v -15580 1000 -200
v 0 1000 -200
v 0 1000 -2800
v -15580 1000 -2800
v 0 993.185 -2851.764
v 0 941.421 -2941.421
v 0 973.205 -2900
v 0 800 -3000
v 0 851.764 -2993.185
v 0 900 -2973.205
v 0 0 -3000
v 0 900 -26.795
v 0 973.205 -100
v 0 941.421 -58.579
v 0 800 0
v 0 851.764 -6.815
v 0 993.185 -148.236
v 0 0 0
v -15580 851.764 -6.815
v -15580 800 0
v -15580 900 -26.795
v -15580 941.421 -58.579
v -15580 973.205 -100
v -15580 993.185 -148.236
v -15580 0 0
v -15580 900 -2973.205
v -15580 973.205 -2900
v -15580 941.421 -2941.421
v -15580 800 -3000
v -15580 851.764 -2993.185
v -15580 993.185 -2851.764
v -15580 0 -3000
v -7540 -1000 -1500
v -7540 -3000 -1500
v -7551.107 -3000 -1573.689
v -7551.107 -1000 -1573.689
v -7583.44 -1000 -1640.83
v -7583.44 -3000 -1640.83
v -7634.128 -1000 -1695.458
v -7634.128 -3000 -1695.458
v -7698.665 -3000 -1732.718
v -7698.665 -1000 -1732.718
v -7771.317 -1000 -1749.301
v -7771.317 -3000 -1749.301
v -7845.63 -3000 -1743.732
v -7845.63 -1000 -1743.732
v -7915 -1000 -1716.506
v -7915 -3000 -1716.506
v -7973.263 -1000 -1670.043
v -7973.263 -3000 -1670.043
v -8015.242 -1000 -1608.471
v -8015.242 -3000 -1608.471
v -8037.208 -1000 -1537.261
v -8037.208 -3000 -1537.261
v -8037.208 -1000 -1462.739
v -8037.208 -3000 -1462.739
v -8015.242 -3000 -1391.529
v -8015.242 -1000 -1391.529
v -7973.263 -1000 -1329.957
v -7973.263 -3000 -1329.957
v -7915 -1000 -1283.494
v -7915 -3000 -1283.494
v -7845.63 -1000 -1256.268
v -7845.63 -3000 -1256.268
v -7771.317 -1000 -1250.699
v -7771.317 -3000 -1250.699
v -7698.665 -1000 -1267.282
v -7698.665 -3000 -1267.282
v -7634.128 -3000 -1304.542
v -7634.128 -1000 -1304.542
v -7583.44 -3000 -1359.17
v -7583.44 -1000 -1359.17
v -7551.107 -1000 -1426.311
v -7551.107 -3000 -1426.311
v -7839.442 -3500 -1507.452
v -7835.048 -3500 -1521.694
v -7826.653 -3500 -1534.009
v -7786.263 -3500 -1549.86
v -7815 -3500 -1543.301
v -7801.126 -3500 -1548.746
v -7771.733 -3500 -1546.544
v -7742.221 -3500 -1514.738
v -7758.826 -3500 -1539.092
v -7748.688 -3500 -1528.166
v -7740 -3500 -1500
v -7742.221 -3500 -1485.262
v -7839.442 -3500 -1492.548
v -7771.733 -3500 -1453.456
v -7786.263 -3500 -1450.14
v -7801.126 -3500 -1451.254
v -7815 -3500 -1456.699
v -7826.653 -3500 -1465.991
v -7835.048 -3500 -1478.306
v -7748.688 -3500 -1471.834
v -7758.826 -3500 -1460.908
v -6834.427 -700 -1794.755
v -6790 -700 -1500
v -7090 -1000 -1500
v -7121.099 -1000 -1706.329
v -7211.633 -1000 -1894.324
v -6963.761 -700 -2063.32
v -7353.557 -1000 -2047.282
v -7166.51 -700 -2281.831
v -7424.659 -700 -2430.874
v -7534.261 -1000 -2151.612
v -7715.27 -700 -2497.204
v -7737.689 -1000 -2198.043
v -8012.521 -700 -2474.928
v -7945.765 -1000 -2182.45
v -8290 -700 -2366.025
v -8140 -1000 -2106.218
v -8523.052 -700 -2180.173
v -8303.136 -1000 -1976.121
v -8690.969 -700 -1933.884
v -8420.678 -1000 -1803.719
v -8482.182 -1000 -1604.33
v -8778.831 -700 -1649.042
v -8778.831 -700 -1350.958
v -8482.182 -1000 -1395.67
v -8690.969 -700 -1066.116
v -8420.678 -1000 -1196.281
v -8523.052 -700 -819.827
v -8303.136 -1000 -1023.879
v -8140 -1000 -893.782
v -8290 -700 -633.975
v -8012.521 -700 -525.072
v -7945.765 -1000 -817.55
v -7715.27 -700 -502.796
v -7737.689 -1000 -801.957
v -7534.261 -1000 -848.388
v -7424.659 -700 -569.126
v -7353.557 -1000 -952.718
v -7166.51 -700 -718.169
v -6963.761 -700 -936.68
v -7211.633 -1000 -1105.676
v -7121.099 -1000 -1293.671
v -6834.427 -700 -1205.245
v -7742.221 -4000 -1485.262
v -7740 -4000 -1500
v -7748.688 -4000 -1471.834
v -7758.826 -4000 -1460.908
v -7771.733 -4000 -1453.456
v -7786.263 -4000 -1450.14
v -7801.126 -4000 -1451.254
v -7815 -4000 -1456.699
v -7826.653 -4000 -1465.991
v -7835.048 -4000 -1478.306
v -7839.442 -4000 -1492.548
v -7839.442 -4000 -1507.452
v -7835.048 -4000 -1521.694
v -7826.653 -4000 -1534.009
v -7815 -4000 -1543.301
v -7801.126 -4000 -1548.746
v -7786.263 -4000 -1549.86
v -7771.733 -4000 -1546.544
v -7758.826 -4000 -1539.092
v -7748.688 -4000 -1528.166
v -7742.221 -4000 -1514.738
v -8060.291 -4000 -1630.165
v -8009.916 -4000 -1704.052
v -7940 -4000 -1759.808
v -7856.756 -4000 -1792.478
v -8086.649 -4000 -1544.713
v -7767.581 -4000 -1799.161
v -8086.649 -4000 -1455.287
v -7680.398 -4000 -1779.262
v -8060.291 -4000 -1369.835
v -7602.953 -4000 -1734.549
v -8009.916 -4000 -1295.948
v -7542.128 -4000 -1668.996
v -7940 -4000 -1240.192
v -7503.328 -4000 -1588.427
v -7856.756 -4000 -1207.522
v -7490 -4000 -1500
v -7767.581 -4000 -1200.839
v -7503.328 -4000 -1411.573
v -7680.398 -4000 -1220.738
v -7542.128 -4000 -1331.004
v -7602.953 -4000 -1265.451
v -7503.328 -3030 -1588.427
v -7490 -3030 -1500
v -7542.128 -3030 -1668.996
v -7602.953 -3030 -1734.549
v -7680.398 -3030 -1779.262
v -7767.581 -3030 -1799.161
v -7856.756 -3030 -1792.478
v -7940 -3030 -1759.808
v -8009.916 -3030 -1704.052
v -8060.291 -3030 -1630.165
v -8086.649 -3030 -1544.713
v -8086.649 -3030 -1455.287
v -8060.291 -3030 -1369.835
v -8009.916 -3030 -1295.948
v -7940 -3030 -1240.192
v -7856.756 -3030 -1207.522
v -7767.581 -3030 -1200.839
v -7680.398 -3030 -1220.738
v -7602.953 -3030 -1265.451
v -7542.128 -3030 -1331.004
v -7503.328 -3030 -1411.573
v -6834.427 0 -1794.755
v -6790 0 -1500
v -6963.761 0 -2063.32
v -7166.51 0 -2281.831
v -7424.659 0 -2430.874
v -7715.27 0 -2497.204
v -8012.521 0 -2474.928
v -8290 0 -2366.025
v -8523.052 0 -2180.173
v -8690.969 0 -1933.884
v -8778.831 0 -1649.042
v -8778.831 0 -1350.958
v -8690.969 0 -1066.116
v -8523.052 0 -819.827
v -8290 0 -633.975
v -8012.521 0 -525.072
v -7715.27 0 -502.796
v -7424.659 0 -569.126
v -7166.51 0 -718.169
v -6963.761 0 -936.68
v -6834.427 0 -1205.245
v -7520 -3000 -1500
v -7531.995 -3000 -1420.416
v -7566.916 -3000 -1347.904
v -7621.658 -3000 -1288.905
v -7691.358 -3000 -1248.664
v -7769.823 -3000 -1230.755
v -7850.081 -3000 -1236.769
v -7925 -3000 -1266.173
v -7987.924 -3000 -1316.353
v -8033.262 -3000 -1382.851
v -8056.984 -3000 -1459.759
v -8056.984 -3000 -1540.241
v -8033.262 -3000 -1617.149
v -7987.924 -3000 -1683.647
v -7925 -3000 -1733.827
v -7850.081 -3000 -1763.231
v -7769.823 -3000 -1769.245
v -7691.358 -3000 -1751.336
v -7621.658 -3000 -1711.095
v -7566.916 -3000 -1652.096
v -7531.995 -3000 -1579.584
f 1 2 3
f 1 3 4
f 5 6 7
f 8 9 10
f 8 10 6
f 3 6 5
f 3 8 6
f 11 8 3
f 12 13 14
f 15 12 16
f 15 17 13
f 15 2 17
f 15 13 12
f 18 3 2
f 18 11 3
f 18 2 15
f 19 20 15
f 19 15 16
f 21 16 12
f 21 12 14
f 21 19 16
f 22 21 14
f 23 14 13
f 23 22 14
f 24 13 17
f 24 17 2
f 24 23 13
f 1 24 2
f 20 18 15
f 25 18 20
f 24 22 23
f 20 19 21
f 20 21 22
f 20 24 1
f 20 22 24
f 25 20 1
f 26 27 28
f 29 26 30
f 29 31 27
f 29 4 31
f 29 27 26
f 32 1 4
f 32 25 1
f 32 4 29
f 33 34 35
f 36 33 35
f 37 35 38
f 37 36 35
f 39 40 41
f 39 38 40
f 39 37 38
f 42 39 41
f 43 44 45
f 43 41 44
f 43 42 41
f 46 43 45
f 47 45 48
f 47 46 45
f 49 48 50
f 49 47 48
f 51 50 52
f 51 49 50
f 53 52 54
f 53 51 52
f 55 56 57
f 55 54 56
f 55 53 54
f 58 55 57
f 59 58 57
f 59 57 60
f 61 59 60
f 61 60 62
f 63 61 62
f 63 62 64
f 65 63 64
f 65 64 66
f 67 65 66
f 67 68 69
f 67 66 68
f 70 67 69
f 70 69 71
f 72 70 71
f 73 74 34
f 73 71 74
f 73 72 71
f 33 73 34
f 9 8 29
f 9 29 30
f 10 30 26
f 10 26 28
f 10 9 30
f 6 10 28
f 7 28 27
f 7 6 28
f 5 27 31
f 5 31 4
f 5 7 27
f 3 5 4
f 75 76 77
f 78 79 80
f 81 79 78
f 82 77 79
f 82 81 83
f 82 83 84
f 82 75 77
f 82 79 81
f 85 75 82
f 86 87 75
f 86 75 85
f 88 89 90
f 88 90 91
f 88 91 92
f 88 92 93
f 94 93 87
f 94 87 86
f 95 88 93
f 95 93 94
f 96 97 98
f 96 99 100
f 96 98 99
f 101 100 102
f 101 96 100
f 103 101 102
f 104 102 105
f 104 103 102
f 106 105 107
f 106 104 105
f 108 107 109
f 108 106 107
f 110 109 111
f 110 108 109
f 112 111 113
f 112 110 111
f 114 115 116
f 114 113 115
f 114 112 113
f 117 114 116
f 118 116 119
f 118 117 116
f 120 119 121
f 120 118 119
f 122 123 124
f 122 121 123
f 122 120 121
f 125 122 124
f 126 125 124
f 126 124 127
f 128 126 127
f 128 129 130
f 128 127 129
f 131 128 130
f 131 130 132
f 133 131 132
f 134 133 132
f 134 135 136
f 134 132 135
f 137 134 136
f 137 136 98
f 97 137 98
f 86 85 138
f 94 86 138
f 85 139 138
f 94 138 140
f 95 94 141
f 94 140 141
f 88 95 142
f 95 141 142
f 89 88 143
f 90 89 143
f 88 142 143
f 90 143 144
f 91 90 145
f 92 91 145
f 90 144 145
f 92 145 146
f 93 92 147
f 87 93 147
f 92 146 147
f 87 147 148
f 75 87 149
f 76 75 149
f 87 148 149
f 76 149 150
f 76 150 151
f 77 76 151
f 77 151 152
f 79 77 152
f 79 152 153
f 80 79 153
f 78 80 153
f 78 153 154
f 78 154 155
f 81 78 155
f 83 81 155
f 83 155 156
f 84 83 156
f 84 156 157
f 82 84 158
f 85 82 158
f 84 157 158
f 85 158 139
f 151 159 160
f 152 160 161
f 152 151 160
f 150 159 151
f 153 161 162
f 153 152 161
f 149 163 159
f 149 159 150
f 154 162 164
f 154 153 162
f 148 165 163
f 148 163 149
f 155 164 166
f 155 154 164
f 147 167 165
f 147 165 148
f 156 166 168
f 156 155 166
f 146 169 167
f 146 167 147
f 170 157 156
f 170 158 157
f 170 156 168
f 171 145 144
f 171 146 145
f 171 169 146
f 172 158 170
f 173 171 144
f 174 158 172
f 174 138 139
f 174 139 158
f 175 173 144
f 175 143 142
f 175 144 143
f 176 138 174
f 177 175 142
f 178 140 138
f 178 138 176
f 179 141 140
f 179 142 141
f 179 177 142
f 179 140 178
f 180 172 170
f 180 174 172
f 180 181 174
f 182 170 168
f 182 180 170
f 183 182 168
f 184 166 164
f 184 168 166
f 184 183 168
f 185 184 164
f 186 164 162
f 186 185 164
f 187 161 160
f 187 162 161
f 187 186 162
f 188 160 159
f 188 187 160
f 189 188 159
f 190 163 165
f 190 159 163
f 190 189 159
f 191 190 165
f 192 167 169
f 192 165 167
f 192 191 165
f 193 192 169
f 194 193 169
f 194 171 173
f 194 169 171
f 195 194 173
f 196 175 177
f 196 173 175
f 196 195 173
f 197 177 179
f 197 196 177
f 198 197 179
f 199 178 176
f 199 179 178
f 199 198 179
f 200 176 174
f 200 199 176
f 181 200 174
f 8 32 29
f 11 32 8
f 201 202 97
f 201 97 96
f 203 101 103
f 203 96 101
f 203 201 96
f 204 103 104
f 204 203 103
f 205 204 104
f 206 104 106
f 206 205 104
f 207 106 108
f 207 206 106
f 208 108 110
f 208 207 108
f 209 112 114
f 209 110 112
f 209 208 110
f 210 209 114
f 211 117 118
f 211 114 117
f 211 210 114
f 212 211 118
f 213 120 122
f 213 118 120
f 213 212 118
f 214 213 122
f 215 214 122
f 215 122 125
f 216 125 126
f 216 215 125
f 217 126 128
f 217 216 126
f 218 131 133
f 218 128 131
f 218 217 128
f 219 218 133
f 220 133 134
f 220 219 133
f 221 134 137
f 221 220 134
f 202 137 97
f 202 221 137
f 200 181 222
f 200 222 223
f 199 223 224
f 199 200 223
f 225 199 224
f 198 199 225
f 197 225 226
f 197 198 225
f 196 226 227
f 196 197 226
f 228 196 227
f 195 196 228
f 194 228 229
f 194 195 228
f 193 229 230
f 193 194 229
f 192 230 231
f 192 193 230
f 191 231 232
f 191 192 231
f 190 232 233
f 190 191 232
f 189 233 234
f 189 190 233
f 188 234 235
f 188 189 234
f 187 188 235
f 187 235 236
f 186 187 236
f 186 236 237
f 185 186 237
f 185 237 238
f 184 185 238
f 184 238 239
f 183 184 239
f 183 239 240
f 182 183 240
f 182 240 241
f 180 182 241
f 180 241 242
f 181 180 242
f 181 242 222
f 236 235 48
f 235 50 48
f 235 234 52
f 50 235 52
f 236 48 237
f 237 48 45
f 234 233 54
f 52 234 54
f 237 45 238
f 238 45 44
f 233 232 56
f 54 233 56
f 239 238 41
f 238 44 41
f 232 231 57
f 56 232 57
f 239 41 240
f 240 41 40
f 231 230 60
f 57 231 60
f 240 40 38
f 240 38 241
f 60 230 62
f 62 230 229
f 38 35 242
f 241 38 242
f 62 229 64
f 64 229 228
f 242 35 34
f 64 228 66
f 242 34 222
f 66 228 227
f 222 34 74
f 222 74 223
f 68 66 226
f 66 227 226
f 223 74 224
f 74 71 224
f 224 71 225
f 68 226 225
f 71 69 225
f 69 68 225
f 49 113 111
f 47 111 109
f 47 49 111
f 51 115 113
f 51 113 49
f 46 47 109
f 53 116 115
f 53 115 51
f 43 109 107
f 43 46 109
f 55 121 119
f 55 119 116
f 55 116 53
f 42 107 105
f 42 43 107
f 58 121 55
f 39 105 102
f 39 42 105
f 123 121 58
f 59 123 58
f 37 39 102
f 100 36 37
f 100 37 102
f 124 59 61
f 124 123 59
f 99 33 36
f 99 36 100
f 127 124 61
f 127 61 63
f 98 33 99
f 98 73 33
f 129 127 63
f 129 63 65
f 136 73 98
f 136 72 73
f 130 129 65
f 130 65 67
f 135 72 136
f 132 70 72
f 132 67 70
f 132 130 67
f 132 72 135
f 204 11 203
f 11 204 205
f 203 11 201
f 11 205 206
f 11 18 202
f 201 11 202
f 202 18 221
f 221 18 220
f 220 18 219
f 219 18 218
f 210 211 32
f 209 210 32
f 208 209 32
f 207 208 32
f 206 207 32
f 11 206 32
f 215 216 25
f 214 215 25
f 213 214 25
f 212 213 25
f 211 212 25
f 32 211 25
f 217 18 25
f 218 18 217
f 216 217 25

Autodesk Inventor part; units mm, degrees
ref_plane "YZ Plane" through (0, 0, 0) normal (1, 0, 0) x (0, 1, 0)
ref_plane "XZ Plane" through (0, 0, 0) normal (0, 1, 0) x (-1, 0, 0)
ref_plane "XY Plane" through (0, 0, 0) normal (0, 0, 1) x (1, 0, 0)
sketch "Sketch1" plane through (0, 0, 0) normal (0, 1, 0) x (-1, 0, 0)
  line L0 (0, 0) -> (15580, 0)
  line L1 (15580, 0) -> (15580, -3000)
  line L2 (15580, -3000) -> (0, -3000)
  line L3 (0, -3000) -> (0, 0)
  dimension "d0" = 15580
  dimension "d1" = 3000
extrude "Extrusion1" add sketch "Sketch1" along normal blind 1000
fillet "Fillet1" radius 200 2 edges at (-7790, 1000, 0) (-7790, 1000, -3000)
sketch "Sketch2" plane through (0, 0, 0) normal (0, -1, 0) x (1, 0, 0)
  circle A0 centre (-7790, -1500) radius 1000
  dimension "d5" = 2000
extrude "Extrusion2" add sketch "Sketch2" along normal blind 1000
sketch "Sketch3" plane through (-7790, -1000, -1500) normal (0, -1, 0) x (1, 0, 0)
  circle A0 centre (0, 0) radius 1000 projected
  circle A1 centre (0, 0) radius 250
  point P0 (7790, 1500)
  dimension "d8" = 500
extrude "Extrusion3" add sketch "Sketch3" along normal blind 2000 contours A1
sketch "Sketch4" plane through (-7790, -3000, -1500) normal (0, -1, 0) x (1, 0, 0)
  circle A0 centre (0, 0) radius 250 projected
  circle A1 centre (0, 0) radius 300
  point P0 (7790, 1500)
  dimension "d12" = 600
extrude "Extrusion4" add sketch "Sketch4" along normal blind 1000 contours A0 | A1
sketch "Sketch5" plane through (-7790, -4000, -1500) normal (0, -1, 0) x (1, 0, 0)
  circle A0 centre (0, 0) radius 300 projected
  circle A1 centre (0, 0) radius 50
  point P0 (7790, 1500)
  dimension "d15" = 100
extrude "Extrusion5" cut sketch "Sketch5" against normal blind 500 contours A1
thread "Thread1" size "M100x6" class "6H" standard "ANSI Metric M Profile" full length
chamfer "Chamfer1" distance 30 angle 45 1 edges at (-8090, -3000, -1500)
chamfer "Chamfer2" distance 300 angle 45 1 edges at (-8790, -1000, -1500)
properties part number "tempathook"
